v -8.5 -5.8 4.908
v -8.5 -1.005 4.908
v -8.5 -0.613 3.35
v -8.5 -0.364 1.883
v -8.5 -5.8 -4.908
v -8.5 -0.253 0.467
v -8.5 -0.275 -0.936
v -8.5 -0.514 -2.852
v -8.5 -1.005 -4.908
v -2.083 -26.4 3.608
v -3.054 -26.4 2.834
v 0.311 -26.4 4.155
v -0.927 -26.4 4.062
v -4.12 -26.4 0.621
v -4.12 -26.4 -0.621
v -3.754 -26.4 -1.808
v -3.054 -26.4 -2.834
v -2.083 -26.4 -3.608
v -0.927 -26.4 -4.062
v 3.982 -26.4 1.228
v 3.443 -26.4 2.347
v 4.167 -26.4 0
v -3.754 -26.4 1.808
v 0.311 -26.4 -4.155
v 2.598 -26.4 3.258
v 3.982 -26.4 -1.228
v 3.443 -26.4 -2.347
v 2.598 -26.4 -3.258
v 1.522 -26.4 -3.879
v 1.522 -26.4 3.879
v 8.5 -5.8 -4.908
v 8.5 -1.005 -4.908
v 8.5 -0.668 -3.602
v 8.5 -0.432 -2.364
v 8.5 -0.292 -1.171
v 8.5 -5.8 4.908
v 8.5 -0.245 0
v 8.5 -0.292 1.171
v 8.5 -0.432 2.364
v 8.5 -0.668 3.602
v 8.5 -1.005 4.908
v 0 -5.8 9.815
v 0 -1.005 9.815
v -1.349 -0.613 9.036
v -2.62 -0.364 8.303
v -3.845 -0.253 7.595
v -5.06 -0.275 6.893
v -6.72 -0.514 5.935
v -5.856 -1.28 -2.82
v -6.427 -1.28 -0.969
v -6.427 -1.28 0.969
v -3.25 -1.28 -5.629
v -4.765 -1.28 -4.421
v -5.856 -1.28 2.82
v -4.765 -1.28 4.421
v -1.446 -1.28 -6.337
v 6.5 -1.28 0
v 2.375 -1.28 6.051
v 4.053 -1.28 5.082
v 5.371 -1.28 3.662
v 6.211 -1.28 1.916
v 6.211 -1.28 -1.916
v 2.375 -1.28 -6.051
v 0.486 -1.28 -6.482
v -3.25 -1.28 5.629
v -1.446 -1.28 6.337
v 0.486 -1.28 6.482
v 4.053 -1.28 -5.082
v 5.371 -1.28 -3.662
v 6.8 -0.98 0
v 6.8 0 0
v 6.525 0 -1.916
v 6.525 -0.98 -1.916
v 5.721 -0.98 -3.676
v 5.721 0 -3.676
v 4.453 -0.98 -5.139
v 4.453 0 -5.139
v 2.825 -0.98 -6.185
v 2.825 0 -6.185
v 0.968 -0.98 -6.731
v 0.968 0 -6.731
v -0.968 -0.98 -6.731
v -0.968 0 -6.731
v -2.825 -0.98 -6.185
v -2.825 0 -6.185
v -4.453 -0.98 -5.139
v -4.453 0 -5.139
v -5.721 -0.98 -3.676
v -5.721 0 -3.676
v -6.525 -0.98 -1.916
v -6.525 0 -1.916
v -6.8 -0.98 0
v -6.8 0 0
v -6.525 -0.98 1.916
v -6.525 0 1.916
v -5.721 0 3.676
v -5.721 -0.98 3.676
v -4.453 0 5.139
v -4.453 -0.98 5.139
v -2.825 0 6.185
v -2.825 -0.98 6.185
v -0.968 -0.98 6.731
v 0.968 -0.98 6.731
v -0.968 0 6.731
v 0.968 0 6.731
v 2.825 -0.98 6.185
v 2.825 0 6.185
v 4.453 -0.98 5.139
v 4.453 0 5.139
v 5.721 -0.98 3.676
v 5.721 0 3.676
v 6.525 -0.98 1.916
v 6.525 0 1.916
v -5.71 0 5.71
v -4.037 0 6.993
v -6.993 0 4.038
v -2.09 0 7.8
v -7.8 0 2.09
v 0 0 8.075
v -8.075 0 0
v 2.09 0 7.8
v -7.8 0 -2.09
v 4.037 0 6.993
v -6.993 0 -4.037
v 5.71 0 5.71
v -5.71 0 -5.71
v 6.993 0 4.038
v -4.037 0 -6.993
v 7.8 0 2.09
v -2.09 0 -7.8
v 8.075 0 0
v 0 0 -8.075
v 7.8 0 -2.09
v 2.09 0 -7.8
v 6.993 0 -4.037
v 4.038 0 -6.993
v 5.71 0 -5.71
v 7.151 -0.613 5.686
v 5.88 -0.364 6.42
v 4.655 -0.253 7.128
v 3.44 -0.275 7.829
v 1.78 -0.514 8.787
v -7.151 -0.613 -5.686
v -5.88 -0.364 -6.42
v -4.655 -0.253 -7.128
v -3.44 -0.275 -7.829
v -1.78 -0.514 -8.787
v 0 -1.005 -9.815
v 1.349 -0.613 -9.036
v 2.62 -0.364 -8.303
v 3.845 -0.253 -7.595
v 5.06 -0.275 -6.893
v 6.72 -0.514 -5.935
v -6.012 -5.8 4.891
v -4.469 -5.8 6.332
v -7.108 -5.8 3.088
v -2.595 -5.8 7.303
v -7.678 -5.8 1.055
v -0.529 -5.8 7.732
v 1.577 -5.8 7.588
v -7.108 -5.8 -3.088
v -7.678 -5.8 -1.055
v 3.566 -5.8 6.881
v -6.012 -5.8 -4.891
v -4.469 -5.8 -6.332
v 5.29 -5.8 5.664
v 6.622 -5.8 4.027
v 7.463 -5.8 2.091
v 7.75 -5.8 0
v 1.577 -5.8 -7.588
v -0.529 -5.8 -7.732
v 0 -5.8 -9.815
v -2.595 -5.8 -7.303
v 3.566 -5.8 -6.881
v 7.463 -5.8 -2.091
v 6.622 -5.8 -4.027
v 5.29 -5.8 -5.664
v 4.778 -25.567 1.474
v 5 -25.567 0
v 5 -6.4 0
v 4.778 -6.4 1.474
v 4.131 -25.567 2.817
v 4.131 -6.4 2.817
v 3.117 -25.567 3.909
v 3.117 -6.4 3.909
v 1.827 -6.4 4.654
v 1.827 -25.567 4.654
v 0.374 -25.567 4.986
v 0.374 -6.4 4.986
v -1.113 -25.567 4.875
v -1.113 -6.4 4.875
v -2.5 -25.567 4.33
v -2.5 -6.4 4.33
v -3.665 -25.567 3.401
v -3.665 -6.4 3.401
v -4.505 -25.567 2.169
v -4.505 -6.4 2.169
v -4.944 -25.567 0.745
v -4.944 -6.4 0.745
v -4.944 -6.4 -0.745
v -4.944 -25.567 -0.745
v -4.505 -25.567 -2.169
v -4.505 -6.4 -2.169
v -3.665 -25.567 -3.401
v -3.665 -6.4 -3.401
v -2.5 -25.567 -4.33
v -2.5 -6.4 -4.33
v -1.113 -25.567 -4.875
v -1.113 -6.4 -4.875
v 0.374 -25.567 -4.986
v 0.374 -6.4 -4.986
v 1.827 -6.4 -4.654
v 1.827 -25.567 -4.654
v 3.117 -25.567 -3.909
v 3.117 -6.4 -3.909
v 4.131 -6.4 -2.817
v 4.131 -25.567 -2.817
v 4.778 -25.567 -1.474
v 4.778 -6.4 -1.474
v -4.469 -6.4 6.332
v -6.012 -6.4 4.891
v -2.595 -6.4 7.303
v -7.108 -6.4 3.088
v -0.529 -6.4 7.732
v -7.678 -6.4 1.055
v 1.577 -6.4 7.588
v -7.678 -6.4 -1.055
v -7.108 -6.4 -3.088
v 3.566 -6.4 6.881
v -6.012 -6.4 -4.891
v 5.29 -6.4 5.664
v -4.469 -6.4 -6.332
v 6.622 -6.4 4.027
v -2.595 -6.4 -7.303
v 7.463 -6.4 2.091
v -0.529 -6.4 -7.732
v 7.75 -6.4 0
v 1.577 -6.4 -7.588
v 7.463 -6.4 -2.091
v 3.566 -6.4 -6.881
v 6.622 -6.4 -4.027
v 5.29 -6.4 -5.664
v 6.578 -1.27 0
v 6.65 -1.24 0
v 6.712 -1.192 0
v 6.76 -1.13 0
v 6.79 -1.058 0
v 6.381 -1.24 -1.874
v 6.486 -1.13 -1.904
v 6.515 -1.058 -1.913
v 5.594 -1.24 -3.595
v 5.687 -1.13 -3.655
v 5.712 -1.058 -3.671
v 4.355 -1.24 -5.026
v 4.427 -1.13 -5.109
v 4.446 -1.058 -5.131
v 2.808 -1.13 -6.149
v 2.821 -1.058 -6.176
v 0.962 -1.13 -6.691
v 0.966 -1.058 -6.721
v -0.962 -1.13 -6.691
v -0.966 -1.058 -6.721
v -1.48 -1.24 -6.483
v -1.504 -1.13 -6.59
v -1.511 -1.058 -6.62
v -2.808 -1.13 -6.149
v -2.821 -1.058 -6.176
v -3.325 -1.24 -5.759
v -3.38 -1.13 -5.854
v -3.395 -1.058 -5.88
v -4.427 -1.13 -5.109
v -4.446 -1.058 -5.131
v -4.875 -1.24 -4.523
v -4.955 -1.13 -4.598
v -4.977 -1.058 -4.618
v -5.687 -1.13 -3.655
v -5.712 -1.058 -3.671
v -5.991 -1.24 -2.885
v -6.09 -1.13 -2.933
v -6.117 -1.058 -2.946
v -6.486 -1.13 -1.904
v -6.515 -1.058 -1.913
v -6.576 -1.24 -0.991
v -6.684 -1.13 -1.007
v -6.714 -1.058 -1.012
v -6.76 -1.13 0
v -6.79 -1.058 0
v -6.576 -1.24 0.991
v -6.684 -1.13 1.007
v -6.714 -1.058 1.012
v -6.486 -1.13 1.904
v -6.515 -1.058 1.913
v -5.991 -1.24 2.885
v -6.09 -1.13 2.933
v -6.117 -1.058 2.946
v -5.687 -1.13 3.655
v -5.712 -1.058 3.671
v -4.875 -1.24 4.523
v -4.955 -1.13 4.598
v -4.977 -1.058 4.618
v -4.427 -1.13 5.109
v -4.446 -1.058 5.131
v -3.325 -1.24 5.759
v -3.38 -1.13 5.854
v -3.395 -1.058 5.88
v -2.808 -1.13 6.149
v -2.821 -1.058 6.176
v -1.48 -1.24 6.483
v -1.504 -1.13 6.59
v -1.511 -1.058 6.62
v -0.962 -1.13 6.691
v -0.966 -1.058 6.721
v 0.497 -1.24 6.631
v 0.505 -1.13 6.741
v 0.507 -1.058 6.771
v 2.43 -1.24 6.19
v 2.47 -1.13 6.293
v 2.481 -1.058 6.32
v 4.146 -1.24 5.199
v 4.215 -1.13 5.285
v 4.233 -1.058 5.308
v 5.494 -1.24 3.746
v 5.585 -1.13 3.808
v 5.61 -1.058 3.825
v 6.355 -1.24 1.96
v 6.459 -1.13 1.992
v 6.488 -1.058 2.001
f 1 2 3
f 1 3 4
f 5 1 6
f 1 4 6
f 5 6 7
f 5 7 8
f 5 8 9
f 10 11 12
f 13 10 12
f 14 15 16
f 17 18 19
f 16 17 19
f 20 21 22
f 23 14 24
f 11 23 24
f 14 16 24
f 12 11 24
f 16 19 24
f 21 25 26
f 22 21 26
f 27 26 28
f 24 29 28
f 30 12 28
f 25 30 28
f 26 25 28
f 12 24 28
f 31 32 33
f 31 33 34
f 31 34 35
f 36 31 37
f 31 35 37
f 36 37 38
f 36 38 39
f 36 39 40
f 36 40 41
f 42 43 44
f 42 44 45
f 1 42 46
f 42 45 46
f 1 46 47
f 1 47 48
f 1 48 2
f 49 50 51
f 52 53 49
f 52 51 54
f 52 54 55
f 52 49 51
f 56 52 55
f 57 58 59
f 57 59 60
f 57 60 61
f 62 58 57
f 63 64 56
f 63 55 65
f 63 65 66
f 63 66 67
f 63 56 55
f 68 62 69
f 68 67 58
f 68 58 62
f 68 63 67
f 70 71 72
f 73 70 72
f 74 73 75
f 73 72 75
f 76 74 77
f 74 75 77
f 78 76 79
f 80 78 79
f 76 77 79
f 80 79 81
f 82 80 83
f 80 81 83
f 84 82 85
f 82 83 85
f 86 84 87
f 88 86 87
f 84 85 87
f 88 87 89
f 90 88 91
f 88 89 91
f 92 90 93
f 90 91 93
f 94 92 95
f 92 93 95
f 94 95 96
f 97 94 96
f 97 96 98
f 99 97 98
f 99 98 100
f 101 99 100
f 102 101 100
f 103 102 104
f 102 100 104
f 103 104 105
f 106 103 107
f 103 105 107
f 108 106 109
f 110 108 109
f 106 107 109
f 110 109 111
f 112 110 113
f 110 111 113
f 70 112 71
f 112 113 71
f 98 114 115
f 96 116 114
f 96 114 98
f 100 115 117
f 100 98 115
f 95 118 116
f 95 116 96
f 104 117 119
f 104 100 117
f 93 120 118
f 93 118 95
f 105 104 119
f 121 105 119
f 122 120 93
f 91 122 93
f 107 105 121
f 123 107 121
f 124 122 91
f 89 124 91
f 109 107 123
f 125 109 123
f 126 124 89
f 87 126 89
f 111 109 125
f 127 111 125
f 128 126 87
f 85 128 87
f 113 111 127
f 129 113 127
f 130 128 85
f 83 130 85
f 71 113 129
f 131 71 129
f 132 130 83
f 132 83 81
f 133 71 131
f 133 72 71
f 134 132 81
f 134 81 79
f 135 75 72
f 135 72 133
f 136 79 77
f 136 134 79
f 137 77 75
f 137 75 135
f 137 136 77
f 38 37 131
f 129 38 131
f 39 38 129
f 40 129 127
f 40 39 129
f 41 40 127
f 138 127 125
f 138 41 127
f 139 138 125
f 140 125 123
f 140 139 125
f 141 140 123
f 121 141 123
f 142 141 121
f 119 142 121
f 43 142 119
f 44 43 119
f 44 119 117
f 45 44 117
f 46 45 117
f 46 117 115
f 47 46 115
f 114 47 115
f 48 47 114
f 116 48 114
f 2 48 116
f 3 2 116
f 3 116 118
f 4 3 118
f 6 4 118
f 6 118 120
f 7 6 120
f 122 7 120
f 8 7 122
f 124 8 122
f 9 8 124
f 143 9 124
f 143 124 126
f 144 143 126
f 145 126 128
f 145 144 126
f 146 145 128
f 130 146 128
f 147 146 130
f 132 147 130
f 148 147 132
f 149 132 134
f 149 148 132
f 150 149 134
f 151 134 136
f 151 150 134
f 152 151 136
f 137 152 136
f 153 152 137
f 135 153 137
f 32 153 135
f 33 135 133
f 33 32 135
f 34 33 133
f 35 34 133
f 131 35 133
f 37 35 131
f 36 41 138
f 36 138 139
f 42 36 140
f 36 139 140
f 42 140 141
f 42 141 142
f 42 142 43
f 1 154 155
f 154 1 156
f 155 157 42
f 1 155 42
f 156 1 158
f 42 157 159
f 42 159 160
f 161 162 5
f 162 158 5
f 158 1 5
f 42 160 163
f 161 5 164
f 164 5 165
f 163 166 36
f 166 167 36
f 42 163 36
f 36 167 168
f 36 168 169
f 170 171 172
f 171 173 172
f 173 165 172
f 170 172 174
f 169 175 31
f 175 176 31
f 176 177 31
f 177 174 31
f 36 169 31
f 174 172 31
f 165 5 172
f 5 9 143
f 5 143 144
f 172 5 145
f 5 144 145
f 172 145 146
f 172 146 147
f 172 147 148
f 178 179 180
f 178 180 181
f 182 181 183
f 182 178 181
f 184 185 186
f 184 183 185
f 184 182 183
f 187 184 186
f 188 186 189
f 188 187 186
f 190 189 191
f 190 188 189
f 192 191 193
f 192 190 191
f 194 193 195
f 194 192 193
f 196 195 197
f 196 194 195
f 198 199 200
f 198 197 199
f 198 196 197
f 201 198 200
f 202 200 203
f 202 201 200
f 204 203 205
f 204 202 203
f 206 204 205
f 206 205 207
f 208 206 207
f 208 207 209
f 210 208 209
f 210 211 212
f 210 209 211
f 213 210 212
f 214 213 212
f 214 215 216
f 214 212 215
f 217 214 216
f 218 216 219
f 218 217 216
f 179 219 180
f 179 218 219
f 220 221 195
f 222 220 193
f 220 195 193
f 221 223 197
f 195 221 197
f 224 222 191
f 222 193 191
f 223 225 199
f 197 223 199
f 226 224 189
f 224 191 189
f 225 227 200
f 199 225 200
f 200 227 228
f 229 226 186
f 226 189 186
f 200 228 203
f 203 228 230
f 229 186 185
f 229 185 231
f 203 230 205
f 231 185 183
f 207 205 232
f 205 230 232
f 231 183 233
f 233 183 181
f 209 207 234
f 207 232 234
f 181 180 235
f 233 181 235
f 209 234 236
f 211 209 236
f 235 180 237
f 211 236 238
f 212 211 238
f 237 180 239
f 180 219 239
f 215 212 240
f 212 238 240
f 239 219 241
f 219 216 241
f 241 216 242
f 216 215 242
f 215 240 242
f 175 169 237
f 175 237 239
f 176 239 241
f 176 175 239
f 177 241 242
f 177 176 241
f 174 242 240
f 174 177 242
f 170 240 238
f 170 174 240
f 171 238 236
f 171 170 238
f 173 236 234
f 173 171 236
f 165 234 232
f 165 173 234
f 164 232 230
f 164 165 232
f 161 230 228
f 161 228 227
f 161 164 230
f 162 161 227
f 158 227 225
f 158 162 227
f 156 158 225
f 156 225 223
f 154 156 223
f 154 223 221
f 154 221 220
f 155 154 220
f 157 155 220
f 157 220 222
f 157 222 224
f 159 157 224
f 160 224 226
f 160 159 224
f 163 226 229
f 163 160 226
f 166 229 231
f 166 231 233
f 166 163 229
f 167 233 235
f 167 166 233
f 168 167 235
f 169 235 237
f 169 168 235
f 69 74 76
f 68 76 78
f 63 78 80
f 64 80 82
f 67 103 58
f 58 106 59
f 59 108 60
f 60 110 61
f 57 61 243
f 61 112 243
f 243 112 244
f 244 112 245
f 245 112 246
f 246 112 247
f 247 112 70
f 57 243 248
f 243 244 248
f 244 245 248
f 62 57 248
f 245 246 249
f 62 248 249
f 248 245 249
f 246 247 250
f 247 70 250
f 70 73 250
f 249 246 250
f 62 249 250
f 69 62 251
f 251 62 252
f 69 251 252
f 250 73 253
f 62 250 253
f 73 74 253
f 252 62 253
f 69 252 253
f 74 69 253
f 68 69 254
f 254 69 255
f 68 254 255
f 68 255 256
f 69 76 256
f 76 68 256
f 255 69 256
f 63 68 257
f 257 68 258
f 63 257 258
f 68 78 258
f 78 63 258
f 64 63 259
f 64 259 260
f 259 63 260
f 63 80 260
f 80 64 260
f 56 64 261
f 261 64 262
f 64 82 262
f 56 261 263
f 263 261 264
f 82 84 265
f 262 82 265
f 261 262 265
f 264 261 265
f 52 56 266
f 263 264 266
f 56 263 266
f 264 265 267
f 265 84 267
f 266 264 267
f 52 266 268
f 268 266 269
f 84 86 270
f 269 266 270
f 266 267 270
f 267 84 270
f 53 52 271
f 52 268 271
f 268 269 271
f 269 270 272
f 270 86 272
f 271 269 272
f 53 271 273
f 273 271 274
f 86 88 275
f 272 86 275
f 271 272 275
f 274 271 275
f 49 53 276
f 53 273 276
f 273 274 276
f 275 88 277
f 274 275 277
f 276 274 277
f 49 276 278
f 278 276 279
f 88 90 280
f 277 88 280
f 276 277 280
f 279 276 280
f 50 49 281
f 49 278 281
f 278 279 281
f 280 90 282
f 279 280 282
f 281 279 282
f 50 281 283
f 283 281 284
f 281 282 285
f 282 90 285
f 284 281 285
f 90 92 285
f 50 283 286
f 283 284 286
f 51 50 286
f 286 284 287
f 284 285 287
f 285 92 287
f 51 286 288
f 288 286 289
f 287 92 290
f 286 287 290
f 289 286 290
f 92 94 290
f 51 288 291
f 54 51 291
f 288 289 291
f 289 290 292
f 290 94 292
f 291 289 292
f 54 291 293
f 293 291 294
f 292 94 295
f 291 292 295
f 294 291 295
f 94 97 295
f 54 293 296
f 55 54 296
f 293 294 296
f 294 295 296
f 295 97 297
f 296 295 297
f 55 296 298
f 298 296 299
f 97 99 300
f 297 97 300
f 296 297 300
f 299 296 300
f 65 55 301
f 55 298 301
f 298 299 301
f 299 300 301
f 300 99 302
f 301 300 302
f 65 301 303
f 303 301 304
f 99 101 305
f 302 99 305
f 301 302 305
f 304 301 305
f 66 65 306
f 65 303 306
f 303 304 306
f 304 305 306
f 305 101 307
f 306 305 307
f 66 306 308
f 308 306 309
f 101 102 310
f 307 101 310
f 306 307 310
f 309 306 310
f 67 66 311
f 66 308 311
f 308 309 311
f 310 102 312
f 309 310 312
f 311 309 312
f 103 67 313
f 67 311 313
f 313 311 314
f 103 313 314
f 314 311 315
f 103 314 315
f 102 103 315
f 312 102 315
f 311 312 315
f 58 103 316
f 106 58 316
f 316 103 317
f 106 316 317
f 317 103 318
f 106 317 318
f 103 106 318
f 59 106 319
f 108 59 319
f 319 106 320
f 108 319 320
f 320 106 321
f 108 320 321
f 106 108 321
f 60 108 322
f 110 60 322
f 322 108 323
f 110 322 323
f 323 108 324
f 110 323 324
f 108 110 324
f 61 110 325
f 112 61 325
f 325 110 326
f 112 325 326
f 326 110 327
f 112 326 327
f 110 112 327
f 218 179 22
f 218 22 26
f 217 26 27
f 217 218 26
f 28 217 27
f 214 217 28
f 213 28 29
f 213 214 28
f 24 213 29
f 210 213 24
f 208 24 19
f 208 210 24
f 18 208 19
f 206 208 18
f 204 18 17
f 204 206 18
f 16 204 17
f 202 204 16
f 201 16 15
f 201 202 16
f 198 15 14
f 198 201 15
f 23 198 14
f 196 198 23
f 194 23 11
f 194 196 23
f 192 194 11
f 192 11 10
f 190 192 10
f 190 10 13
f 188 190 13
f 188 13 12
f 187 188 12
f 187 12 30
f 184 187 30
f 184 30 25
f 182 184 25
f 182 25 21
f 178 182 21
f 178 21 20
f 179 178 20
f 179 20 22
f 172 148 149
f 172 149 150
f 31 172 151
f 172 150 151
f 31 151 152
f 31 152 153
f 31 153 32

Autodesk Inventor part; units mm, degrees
ref_plane "YZ Plane" through (0, 0, 0) normal (1, 0, 0) x (0, 1, 0)
ref_plane "XZ Plane" through (0, 0, 0) normal (0, 1, 0) x (-1, 0, 0)
ref_plane "XY Plane" through (0, 0, 0) normal (0, 0, 1) x (1, 0, 0)
sketch "Sketch1" plane through (0, 0, 0) normal (0, 0, 1) x (1, 0, 0)
  line L0 (6.8, 0) -> (8.075, 0)
  line L1 (12.75, -2.6991) -> (12.75, -5.8)
  line L2 (7.75, -6.4) -> (5, -6.4)
  line L3 (5, -6.4) -> (5, -26.4)
  line L4 (5, -26.4) -> (0, -26.4)
  line L5 (0, -26.4) -> (0, 0)
  line L6 (7.75, -6.4) -> (7.75, -5.8)
  line L7 (7.75, -5.8) -> (12.75, -5.8)
  line L8 (0, -1.28) -> (6.5, -1.28)
  line L9 (6.8, -0.98) -> (6.8, 0)
  line L10 (8.075, 0) -> (12.75, -2.6991)
  arc A0 (6.5, -1.28) -> (6.8, -0.98) centre (6.5, -0.98) ccw
  dimension "d0" = 25.5
  dimension "d1" = 10
  dimension "d3" = 20
  dimension "d4" = 15.5
  dimension "d5" = 0.6
  dimension "d26" = 16.15
  dimension "d27" = 30
  dimension "d28" = 13.6
  dimension "d29" = 1.28
  dimension "d30" = 0.3
  dimension "d31" = 6.4
revolve "Revolution1" add sketch "Sketch1" angle 360 about axis through (0, -26.4, 0) along (0, 1, 0)
sketch "Sketch2" plane through (0, 0, 0) normal (0, 1, 0) x (1, 0, 0)
  line L0 (0, -9.815) -> (-8.5, -4.9075)
  line L1 (-8.5, -4.9075) -> (-8.5, 4.9075)
  line L2 (-8.5, 4.9075) -> (0, 9.815)
  line L3 (0, 9.815) -> (8.5, 4.9075)
  line L4 (8.5, 4.9075) -> (8.5, -4.9075)
  line L5 (8.5, -4.9075) -> (0, -9.815)
  circle A0 centre (0, 0) radius 12.75 projected
  point P0 (0, 0)
  point P1 (0, 0)
  dimension "d32" = 17
extrude "Extrusion1" cut sketch "Sketch2" against normal blind 5.8
thread "Thread1" size "M10x1.5" class "6g" standard "ISO Metric profile" length 18
chamfer "Chamfer1" distance 0.8333 angle 45 1 edges at (-5, -26.4, 0)
equation "\"d0\" = 1.5 * S_"
equation "\"d1\" = d1_"
equation "\"d3\" = L"
equation "\"d4\" = dw"
equation "\"d5\" = hw"
equation "\"d26\" = 0.95 * S_"
equation "\"d28\" = 0.8 * S_"
equation "\"d29\" = 0.2 * k"
equation "\"d31\" = k"
equation "\"d14\" = b"
equation "\"d16\" = 0.0833333 * d"
equation "\"d32\" = S_"
equation "\"d33\" = k - hw"
equation "\"d1_\" = 10"
equation "\"S_\" = 17"
equation "\"k\" = 6.4"
equation "\"e\" = 18.7"
equation "\"L\" = 20"
equation "\"b\" = 18"
equation "\"Grip_Length\" = 2"
equation "\"dw\" = 15.5"
equation "\"hw\" = 0.6"
equation "\"d\" = 10"
properties part number "Bolt 4A M10-6g×20 GOST 7798-70" material "Steel, Mild"
